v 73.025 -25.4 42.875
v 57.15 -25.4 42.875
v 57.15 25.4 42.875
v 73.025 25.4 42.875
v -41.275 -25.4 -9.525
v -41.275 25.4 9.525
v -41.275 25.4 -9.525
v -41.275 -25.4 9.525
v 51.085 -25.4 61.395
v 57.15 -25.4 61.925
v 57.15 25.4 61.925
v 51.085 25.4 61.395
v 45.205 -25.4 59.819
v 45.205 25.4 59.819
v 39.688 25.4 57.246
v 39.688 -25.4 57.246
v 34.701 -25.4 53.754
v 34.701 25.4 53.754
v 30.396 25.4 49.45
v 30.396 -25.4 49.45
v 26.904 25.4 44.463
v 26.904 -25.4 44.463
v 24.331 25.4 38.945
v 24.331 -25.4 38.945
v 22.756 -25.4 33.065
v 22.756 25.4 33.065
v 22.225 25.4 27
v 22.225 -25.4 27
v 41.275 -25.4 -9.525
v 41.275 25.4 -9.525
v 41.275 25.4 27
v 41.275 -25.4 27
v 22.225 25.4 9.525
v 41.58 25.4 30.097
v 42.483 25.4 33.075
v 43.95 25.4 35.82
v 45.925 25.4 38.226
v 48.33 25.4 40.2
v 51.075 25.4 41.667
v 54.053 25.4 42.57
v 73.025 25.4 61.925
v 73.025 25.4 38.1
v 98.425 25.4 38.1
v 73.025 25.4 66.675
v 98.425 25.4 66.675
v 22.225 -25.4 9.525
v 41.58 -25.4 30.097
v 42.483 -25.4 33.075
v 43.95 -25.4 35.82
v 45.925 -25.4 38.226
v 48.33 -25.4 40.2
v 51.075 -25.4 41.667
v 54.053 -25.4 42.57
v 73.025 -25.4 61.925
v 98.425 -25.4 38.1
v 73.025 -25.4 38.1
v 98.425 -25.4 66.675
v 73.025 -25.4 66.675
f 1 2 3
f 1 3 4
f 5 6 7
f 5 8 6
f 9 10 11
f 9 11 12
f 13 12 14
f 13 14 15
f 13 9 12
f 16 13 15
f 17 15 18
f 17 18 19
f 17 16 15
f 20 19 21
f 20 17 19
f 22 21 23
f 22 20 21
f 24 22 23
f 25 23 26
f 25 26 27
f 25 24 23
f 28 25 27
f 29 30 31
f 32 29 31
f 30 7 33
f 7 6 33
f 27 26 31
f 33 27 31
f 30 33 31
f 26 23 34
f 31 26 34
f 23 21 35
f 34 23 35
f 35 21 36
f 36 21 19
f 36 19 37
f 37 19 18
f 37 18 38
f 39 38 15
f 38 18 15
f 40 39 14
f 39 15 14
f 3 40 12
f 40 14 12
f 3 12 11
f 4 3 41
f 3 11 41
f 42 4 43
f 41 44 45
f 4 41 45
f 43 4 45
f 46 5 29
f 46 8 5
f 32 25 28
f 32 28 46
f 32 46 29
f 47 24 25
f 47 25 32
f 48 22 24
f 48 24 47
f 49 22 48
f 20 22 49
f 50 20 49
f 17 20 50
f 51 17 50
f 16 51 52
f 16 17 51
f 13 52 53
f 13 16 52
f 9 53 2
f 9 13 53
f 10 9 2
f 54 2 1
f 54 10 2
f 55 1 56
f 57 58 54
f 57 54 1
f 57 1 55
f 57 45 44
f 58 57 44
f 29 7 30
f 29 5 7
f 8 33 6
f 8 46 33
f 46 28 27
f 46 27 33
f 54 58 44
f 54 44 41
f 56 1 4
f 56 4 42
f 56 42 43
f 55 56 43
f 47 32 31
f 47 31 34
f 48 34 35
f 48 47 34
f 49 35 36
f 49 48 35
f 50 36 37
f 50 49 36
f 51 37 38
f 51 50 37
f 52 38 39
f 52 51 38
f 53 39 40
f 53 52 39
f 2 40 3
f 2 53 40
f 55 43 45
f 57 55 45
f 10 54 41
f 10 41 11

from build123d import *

# Parameters (mm, degrees)
F1_DEPTH = 25.4


with BuildPart() as f1:
    # F0 (on Front) → F1 (new body, symmetric)
    with BuildSketch(Plane.XZ):
        Polygon((-41.275, -9.525), (41.275, -9.525), (41.275, 9.525), (22.225, 9.525), (-41.275, 9.525), align=None)
        with BuildLine():
            Line((22.225, 9.525), (41.275, 9.525))
            Line((41.275, 9.525), (41.275, 27.0002))
            ThreePointArc((41.275, 27.0002), (45.92468, 38.22552), (57.15, 42.8752))
            Line((57.15, 42.8752), (73.025, 42.8752))
            Line((73.025, 42.8752), (73.025, 43.09893))
            Line((73.025, 43.09893), (73.025, 61.9252))
            Line((73.025, 61.9252), (57.15, 61.9252))
            ThreePointArc((57.15, 61.9252), (32.454296, 51.695904), (22.225, 27.0002))
            Line((22.225, 27.0002), (22.225, 9.525))
        make_face()
        Polygon((73.025, 43.09893), (73.025, 42.8752), (73.025, 38.1), (98.425, 38.1), (98.425, 66.675), (73.025, 66.675), (73.025, 61.9252), align=None)
    extrude(amount=F1_DEPTH, both=True)


solid = f1.part
